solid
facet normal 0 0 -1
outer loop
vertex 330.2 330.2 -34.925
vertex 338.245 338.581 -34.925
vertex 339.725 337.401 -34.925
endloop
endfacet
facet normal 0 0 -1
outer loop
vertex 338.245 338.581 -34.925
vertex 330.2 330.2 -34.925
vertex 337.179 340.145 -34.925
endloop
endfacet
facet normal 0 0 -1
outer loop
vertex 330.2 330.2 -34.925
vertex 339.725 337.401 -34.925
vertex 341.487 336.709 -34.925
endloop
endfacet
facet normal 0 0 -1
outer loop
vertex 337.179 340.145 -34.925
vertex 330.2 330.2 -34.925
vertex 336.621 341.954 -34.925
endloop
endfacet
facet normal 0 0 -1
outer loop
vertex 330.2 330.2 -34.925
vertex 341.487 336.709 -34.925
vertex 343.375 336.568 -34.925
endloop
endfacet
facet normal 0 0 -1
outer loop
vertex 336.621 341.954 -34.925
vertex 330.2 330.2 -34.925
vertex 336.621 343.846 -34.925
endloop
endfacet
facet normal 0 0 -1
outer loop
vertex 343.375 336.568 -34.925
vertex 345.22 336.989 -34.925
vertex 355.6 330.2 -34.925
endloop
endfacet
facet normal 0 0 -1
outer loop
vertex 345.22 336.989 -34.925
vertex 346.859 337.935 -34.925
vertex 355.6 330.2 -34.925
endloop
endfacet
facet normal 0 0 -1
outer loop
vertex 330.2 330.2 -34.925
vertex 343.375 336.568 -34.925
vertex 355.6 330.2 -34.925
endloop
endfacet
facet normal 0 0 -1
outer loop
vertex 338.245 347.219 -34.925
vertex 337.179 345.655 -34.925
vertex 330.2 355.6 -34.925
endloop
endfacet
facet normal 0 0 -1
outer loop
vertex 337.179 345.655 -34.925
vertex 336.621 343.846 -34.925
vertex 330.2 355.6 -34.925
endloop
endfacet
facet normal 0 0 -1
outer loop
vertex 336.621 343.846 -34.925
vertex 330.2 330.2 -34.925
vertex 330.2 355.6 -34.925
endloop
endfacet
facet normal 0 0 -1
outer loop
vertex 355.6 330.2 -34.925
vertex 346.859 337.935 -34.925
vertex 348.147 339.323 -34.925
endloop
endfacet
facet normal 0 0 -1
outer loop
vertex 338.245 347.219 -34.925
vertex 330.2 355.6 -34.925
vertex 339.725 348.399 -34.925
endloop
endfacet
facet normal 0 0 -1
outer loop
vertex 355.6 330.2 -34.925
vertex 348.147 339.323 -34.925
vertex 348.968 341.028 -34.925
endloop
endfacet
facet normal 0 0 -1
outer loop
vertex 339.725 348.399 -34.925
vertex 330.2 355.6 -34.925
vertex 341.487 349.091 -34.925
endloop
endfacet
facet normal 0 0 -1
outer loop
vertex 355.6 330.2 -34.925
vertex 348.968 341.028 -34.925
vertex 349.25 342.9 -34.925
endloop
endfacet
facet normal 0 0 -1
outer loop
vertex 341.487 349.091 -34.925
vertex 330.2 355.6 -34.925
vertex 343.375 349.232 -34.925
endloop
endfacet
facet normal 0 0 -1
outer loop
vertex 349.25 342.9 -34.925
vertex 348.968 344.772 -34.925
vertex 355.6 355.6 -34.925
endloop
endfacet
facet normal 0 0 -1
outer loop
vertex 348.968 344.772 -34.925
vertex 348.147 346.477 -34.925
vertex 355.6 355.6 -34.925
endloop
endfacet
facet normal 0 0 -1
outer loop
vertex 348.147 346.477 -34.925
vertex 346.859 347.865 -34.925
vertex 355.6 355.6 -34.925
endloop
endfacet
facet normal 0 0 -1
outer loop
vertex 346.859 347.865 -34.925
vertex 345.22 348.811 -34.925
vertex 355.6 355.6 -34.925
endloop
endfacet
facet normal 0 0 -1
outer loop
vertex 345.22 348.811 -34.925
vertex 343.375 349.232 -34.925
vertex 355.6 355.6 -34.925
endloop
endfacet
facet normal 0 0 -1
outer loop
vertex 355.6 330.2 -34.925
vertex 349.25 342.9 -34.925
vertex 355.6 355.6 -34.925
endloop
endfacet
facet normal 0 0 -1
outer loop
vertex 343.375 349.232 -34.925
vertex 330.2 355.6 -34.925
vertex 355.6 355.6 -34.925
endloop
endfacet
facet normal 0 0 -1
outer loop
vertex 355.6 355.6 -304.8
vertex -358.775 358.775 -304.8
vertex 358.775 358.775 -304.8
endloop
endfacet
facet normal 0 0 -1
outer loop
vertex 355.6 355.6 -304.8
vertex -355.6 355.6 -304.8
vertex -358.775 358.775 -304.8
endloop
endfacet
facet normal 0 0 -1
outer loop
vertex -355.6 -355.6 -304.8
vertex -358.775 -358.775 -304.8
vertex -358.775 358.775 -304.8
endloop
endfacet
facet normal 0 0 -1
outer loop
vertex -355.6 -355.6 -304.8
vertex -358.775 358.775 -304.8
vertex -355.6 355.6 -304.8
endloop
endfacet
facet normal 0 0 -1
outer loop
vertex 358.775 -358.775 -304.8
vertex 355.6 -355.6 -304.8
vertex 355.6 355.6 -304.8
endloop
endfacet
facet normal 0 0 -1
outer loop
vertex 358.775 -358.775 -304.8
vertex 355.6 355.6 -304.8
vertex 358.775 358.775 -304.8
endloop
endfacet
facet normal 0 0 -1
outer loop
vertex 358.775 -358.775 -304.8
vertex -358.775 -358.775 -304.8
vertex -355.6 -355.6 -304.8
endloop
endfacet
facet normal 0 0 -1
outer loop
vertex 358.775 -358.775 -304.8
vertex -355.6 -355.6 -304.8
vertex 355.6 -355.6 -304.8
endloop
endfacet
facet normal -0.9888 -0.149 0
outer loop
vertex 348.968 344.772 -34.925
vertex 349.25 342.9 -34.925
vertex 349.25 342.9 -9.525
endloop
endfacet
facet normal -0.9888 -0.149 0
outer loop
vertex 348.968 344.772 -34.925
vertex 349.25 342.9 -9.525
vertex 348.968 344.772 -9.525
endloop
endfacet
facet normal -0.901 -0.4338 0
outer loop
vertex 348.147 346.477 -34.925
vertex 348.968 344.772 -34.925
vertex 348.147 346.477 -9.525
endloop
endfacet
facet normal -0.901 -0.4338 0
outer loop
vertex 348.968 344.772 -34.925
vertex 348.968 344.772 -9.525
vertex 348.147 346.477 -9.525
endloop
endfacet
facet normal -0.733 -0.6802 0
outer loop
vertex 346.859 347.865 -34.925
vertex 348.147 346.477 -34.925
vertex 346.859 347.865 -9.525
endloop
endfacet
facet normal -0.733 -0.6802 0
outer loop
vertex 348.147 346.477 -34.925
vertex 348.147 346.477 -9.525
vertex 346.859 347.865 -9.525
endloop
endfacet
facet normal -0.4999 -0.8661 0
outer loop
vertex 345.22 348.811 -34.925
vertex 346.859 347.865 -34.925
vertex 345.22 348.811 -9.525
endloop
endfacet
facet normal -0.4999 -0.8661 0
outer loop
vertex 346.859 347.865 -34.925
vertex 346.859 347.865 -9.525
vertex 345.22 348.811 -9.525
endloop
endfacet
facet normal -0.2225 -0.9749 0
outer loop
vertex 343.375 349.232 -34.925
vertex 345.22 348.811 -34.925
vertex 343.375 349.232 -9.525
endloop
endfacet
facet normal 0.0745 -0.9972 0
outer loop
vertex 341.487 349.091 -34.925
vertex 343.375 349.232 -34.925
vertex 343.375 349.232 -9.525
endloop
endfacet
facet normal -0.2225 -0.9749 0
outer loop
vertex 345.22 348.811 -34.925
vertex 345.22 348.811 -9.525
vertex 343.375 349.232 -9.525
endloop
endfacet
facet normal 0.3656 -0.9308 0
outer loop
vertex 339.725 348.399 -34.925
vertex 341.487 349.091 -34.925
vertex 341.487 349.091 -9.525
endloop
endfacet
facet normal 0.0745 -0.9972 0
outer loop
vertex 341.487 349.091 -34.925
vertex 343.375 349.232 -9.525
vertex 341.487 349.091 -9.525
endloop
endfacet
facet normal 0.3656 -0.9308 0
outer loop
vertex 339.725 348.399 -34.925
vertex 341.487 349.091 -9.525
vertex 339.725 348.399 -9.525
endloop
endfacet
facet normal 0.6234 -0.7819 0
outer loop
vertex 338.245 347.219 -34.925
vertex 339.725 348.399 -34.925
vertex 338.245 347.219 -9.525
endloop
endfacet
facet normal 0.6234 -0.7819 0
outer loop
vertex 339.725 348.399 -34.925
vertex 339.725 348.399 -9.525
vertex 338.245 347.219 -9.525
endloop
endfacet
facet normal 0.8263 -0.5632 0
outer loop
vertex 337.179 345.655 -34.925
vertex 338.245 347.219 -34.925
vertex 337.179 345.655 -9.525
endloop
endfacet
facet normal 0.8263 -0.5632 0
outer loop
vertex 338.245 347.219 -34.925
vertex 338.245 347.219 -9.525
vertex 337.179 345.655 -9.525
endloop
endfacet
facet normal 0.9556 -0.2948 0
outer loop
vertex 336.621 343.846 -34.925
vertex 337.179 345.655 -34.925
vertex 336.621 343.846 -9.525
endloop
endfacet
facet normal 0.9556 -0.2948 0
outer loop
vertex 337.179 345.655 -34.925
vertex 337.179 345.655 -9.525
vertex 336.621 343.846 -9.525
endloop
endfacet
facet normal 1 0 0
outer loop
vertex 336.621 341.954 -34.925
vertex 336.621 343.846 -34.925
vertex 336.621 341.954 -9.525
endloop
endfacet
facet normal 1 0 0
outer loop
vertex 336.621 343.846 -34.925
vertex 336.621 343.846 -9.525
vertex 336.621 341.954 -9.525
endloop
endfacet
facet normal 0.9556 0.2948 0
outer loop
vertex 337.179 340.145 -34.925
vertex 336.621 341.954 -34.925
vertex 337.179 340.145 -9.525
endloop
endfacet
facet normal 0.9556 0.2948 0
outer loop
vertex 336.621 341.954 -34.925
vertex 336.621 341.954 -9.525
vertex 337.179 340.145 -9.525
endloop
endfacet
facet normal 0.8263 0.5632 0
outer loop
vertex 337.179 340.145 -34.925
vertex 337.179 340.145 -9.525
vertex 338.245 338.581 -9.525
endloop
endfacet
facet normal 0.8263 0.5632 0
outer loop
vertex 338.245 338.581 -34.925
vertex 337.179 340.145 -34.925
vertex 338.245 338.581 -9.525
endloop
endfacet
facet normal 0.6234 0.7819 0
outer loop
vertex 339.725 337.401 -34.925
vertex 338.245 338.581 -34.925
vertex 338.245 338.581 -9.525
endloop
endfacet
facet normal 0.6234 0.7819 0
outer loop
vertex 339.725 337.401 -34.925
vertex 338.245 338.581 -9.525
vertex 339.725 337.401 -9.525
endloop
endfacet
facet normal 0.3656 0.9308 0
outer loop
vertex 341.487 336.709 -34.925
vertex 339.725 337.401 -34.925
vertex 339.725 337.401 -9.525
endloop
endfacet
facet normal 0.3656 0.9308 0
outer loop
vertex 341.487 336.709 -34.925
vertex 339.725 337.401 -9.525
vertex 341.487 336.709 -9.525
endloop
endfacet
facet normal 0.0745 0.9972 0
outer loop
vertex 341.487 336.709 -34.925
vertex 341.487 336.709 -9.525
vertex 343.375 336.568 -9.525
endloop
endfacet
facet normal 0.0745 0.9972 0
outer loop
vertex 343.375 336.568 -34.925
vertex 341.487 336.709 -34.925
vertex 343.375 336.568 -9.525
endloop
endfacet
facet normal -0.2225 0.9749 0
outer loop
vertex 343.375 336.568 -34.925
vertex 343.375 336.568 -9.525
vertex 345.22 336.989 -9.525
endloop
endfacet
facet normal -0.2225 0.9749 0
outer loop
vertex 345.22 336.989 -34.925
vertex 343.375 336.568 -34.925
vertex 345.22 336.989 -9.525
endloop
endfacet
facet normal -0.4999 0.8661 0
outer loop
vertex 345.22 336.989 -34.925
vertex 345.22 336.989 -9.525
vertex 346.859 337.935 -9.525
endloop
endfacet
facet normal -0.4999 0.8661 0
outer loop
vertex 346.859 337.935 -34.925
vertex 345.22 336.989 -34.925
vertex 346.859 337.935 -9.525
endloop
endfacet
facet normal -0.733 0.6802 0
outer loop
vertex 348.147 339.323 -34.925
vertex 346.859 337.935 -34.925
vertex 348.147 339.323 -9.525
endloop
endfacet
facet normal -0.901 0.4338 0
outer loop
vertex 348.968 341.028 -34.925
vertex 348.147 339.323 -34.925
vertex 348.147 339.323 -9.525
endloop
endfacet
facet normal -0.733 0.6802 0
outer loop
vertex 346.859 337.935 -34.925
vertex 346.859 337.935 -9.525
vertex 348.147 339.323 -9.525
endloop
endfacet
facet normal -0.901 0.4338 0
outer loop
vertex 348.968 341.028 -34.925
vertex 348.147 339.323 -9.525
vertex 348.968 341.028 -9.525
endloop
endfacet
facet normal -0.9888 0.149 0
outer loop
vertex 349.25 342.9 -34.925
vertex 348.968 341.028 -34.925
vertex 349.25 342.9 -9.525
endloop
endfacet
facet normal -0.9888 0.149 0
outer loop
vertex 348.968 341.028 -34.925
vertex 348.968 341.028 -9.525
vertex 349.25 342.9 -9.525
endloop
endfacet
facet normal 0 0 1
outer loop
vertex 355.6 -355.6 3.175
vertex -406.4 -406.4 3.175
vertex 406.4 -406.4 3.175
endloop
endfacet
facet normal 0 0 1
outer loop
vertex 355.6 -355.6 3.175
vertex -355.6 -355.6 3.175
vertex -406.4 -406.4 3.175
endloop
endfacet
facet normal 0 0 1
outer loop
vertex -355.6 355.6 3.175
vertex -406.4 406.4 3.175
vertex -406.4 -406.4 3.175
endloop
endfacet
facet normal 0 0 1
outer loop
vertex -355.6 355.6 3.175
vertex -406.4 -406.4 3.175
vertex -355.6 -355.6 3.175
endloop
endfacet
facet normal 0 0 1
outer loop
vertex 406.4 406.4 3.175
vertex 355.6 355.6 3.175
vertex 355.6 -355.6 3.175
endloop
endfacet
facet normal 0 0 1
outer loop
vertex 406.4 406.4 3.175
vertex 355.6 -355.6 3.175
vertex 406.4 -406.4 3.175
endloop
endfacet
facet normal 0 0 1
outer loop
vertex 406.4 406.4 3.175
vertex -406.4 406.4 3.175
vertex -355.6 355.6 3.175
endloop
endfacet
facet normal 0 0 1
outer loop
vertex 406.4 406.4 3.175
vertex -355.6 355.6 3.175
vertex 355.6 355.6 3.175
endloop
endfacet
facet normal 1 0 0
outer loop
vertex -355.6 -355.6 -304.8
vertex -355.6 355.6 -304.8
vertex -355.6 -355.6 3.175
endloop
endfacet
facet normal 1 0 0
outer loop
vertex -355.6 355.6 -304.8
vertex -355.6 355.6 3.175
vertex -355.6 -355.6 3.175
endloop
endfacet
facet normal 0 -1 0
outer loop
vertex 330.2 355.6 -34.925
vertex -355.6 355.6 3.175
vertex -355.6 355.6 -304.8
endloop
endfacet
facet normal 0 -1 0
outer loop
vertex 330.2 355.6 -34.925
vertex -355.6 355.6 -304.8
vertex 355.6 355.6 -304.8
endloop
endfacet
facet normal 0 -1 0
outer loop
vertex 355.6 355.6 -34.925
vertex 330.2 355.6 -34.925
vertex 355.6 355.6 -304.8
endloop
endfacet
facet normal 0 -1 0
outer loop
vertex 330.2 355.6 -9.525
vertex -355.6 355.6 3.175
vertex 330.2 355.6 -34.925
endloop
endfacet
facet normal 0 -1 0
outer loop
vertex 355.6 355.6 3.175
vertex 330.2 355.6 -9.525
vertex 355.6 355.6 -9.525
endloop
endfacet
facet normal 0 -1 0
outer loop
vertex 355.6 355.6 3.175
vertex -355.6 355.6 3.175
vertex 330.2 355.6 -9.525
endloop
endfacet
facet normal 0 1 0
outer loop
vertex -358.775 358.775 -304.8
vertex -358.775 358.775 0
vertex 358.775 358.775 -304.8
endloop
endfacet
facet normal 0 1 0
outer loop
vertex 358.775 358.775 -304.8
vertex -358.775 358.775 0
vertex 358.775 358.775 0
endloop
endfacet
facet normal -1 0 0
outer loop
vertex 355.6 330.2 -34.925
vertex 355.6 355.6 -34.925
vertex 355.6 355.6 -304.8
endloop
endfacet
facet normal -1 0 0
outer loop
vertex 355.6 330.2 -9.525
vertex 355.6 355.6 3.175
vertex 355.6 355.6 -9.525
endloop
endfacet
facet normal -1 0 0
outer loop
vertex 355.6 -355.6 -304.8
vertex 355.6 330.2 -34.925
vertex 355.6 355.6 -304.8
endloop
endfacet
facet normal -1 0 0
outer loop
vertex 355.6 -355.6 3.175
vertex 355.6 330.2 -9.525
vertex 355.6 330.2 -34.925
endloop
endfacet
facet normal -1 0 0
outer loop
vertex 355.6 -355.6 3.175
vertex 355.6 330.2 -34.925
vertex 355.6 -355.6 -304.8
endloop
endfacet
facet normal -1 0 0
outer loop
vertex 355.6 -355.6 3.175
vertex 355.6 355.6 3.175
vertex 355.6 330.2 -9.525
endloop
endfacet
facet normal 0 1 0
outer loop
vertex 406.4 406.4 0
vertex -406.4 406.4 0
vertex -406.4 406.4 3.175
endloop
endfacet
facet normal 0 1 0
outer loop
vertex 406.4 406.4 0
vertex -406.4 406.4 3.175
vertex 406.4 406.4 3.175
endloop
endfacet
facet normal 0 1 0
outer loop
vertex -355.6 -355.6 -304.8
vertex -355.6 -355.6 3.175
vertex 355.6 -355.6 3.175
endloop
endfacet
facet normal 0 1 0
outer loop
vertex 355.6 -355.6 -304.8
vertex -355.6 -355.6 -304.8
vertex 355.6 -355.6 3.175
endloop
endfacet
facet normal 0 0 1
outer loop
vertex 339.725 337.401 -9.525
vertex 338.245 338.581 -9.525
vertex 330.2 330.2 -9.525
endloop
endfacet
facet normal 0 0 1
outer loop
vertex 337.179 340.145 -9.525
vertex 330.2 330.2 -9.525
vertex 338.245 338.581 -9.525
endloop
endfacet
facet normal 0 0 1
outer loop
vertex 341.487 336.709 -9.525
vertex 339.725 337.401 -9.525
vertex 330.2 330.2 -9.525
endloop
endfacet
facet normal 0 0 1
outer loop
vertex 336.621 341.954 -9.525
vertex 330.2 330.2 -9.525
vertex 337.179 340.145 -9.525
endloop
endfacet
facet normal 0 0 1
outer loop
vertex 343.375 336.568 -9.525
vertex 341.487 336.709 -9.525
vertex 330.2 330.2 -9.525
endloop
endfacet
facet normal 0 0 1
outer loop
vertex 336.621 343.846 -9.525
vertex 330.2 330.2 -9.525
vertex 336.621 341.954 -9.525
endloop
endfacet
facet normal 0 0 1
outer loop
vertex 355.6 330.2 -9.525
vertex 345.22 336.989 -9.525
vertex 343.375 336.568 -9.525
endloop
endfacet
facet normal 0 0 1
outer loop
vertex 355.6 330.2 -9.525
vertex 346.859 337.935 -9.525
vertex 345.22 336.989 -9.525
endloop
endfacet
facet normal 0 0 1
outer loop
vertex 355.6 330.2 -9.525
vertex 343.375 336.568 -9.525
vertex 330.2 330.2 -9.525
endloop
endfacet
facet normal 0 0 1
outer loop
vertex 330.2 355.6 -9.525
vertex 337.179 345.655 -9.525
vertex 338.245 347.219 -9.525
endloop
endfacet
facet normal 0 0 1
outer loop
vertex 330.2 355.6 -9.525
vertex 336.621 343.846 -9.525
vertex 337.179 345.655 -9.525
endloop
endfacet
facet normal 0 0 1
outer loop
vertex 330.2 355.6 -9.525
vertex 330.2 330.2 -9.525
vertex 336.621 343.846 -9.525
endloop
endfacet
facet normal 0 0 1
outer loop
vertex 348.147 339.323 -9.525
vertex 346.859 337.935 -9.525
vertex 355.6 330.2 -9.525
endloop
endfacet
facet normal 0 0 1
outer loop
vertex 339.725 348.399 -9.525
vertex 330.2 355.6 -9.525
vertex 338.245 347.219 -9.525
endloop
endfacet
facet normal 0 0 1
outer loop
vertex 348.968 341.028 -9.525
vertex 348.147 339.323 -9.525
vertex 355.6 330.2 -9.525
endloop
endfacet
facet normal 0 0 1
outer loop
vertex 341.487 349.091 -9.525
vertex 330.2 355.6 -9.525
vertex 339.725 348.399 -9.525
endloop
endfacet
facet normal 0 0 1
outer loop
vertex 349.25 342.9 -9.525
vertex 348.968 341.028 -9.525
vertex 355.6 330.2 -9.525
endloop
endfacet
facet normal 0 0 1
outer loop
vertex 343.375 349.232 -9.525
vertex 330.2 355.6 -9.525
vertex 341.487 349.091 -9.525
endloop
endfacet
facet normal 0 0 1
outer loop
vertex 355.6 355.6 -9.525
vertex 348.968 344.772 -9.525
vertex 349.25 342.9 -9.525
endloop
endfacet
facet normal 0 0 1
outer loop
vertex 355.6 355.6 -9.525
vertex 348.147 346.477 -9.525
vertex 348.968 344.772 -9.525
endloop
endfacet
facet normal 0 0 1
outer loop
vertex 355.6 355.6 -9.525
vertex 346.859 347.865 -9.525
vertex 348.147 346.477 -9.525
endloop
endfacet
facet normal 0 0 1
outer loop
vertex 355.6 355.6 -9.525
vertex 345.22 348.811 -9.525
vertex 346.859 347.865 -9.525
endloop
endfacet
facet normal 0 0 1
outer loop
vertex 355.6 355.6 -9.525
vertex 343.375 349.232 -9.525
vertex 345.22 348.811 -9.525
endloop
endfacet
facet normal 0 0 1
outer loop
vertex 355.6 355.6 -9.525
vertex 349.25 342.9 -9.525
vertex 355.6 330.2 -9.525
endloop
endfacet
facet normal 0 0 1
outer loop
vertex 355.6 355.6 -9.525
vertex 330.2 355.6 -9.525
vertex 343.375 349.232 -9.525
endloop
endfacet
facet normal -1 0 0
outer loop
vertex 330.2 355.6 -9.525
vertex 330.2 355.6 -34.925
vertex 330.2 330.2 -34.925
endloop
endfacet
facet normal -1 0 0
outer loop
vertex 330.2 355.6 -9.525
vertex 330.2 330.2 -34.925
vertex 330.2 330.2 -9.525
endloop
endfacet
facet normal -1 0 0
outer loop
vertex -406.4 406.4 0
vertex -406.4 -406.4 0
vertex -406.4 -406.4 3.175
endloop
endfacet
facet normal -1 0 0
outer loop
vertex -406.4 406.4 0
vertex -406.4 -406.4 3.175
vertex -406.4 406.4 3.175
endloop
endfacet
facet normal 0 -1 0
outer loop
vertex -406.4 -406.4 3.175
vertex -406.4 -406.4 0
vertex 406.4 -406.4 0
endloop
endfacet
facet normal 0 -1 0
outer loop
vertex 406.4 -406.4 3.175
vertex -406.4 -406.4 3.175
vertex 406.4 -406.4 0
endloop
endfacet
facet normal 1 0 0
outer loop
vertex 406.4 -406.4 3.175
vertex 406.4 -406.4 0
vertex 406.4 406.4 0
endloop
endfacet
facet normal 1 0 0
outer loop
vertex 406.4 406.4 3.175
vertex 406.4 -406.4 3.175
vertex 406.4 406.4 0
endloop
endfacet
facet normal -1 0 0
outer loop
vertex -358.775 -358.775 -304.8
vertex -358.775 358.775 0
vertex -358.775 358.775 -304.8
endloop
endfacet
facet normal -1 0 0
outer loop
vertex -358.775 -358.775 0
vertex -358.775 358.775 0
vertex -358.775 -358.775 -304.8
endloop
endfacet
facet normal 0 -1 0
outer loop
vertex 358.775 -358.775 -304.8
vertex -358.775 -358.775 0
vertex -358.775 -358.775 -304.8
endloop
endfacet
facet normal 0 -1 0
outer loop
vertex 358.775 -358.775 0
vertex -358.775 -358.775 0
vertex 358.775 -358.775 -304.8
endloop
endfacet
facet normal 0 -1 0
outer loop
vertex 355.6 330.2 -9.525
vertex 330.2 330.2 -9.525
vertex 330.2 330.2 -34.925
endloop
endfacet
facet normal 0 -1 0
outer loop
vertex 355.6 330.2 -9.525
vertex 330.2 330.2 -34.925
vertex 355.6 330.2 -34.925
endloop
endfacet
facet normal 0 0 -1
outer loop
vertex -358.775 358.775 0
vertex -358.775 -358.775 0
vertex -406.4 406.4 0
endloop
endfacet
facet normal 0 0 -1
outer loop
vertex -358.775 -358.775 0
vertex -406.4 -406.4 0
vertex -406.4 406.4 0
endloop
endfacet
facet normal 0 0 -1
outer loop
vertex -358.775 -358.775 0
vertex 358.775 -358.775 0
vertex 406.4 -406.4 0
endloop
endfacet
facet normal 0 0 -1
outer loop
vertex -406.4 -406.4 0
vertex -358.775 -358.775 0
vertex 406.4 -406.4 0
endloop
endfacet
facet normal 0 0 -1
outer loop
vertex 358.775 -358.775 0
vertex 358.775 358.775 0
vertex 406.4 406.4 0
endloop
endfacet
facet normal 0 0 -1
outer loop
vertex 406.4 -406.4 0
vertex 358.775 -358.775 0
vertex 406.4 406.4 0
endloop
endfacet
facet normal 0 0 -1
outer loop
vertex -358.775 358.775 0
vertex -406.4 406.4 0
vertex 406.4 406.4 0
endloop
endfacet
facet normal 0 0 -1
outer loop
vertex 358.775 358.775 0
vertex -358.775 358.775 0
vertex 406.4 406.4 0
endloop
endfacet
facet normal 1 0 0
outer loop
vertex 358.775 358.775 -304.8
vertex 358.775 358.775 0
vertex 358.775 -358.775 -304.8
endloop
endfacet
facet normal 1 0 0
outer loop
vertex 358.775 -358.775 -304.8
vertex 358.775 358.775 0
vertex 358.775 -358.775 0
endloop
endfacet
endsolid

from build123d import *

# Parameters (mm, degrees)
F0_W     = 812.8
F0_H     = 812.8
F0_W_2   = 711.2
F0_H_2   = 711.2
F1_DEPTH = 3.175
F2_W     = 717.55
F2_H     = 717.55
F2_W_2   = 711.2
F2_H_2   = 711.2
F3_DEPTH = 304.8
F4_W     = 25.4
F4_H     = 25.4
F5_DEPTH = 25.4
F6_R     = 6.35
F7_DEPTH = 25.4


with BuildPart() as f1:
    # F0 (on Top) → F1 (new body)
    with BuildSketch(Plane.XY):
        Rectangle(F0_W, F0_H)
        Rectangle(F0_W_2, F0_H_2, mode=Mode.SUBTRACT)
    extrude(amount=F1_DEPTH)

    # F2 (on face) → F3 (join)
    with BuildSketch(Plane(origin=(0, 0, 0), x_dir=(1, 0, 0), z_dir=(0, 0, -1))):
        Rectangle(F2_W, F2_H)
        Rectangle(F2_W_2, F2_H_2, mode=Mode.SUBTRACT)
    extrude(amount=F3_DEPTH)

    # F4 (on face) → F5 (join)
    with BuildSketch(Plane.XZ.offset(-355.6)):
        with Locations((342.9, -22.225)):
            Rectangle(F4_W, F4_H)
    extrude(amount=F5_DEPTH)

    # F6 (on face) → F7 (cut, through all)
    with BuildSketch(Plane.XY.offset(-9.525)):
        with Locations((342.9, 342.9)):
            Circle(F6_R)
    extrude(amount=-F7_DEPTH, mode=Mode.SUBTRACT)


solid = f1.part
